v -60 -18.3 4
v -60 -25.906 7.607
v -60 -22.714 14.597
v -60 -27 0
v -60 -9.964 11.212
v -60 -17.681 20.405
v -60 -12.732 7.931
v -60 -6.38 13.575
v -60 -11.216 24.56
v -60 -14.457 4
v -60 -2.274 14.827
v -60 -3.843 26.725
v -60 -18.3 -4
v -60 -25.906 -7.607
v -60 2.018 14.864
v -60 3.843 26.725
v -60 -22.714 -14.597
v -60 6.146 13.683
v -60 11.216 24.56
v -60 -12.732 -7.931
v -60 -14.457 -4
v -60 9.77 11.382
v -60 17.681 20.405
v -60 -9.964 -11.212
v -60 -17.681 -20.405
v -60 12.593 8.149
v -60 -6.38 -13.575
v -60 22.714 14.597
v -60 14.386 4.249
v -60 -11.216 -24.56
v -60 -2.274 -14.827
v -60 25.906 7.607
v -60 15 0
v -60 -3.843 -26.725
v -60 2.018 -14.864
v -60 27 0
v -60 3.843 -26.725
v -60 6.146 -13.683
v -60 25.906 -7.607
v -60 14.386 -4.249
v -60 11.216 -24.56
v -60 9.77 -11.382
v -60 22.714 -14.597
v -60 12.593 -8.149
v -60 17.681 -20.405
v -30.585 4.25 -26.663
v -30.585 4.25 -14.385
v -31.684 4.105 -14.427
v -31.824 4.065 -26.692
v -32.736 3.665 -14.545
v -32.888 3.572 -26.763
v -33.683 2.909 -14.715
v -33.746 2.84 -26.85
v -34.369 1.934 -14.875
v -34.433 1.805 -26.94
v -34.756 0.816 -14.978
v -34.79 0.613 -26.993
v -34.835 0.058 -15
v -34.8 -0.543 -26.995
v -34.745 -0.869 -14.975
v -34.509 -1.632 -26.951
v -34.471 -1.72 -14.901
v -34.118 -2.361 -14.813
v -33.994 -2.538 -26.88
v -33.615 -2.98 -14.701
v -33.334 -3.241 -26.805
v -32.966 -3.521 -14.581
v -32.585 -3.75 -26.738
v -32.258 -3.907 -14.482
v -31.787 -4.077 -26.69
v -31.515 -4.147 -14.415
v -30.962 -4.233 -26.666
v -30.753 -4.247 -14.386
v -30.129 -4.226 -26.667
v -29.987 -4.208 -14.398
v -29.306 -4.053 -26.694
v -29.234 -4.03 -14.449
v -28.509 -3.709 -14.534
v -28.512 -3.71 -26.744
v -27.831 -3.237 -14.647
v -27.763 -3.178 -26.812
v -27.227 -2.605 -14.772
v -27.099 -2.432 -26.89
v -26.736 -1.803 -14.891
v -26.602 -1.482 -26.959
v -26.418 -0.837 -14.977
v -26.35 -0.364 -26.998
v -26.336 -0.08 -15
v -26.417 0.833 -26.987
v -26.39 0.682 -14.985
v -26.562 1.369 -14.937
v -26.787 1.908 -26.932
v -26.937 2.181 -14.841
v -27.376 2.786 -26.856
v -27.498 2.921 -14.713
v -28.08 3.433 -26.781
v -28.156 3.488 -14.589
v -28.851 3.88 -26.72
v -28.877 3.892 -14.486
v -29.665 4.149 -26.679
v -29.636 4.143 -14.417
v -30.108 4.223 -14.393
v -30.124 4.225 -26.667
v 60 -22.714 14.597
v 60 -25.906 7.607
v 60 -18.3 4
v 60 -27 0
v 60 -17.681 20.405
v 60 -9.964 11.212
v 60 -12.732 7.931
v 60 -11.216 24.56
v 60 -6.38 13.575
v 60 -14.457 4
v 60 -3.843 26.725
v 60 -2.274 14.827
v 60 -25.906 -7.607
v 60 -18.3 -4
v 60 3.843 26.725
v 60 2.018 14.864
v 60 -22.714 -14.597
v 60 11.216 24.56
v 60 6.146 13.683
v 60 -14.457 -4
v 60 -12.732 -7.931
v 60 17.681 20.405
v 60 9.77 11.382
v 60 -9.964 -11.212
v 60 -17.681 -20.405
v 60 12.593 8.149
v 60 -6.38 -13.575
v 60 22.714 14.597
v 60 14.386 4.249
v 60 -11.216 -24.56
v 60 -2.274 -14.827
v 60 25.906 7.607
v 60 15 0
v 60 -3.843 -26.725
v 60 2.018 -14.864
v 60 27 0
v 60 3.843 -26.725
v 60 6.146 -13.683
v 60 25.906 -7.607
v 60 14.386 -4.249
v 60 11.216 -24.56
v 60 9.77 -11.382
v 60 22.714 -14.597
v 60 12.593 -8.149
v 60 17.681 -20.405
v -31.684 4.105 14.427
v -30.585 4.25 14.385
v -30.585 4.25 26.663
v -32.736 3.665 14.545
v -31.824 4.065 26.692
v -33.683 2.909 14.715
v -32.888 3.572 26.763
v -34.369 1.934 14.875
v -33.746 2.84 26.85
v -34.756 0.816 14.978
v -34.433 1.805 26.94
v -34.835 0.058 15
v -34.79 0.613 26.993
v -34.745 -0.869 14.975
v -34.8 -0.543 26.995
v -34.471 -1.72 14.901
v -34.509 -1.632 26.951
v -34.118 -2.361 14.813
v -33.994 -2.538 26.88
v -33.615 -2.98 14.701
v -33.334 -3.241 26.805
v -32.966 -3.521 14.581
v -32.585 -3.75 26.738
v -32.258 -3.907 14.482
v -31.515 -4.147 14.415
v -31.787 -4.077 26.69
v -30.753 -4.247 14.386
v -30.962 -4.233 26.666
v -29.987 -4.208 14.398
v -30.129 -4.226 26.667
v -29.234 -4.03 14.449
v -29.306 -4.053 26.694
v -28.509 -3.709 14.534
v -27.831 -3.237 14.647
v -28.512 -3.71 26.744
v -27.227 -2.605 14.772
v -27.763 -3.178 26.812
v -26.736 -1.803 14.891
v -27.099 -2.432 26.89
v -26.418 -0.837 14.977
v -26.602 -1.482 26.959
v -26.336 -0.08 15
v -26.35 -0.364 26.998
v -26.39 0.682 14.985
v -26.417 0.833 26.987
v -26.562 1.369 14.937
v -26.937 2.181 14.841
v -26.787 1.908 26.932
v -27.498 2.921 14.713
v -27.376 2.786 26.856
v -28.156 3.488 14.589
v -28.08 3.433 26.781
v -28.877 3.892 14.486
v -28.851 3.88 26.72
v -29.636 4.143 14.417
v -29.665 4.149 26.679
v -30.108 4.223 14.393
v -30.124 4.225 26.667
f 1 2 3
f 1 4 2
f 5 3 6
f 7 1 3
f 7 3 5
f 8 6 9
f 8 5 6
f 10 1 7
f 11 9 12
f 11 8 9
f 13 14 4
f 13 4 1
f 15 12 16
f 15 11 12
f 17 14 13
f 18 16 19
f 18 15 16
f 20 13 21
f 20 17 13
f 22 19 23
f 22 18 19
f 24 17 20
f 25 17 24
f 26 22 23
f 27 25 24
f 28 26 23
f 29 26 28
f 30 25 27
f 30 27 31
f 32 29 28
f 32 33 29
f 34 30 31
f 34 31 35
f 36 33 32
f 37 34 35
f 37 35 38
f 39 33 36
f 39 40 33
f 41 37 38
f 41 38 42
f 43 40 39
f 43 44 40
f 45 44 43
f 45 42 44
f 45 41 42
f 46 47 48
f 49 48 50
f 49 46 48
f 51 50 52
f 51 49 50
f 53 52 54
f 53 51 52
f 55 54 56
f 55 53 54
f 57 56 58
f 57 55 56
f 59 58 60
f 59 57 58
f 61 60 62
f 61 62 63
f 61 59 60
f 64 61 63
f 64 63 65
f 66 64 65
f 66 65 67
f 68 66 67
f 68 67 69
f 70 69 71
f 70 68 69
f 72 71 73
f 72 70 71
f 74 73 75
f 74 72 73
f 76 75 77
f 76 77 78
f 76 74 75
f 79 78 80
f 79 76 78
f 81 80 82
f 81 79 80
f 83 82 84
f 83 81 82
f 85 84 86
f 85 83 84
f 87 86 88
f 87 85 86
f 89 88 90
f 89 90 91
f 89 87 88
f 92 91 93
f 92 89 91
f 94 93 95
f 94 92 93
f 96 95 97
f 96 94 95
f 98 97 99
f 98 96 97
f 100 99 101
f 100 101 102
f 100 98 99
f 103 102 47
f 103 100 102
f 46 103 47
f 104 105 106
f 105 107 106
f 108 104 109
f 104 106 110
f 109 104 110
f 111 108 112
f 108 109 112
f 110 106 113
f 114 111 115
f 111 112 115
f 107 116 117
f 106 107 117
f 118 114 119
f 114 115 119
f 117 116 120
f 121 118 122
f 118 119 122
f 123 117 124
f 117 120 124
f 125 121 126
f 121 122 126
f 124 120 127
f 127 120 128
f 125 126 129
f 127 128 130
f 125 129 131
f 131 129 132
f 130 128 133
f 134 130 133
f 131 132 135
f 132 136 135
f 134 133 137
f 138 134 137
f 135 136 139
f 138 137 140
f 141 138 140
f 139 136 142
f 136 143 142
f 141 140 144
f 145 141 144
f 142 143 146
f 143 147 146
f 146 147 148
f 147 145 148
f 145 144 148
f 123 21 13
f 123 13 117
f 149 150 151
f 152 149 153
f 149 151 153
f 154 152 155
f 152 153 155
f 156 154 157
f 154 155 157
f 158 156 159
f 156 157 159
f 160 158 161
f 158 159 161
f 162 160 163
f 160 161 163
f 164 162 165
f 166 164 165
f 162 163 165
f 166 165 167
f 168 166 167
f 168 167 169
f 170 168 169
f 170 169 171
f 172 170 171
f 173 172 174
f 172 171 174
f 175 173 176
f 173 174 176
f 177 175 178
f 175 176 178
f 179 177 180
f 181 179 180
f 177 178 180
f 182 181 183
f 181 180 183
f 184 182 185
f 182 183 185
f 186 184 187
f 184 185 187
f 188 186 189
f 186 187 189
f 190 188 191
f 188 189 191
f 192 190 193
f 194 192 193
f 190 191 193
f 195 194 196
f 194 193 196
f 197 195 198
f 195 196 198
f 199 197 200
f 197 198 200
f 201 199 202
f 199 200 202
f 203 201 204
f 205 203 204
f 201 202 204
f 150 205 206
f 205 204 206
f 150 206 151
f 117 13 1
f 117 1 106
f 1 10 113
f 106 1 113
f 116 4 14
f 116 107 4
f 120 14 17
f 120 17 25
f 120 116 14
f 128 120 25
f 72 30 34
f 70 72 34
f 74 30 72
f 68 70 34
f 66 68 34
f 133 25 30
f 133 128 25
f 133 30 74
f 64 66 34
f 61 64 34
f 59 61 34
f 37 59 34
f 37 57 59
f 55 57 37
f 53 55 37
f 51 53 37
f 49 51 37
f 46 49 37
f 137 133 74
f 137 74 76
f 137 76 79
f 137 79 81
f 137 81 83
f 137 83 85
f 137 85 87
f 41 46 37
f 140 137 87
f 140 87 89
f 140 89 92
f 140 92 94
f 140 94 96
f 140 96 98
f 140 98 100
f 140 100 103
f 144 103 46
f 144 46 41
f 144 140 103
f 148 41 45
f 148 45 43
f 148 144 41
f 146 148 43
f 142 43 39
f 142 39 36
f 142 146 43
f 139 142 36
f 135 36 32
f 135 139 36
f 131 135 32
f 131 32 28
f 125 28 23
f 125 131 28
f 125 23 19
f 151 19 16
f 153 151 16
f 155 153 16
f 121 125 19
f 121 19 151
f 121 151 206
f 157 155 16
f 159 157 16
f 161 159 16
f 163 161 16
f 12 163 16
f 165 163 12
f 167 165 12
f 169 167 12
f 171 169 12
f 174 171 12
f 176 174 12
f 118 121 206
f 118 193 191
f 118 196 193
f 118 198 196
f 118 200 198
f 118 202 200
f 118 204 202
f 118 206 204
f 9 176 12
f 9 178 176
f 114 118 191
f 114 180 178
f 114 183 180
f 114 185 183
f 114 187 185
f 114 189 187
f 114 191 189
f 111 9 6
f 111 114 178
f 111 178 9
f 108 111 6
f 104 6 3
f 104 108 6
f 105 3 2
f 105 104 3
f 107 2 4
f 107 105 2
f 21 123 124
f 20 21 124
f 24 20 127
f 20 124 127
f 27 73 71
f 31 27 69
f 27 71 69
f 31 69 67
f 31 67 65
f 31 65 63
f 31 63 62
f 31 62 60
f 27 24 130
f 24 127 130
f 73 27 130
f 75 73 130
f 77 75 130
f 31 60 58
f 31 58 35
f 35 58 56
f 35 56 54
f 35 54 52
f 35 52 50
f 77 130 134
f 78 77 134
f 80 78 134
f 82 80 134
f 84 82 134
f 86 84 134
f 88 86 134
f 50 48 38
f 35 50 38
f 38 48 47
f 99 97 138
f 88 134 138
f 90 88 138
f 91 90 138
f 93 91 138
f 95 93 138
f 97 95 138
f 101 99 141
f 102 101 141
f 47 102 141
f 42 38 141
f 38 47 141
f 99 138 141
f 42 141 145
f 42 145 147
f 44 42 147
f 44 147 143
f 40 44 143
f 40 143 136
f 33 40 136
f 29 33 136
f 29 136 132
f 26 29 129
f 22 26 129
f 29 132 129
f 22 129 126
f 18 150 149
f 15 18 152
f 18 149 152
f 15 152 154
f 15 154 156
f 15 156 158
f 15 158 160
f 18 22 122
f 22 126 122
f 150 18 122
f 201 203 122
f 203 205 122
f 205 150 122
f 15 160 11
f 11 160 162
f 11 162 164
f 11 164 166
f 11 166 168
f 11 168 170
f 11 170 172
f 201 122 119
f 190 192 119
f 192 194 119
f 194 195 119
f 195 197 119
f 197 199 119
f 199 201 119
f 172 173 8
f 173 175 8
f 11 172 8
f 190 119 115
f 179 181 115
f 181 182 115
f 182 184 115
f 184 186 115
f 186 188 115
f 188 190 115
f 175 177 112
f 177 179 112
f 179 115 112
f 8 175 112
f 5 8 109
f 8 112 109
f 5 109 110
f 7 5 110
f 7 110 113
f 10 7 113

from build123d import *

# Parameters (mm, degrees)
IZIM1_W               = 120
IZIM1_H               = 12
IZIM2_W               = 120
IZIM2_H               = 8
KES_EKSTR_ZYON1_DEPTH = 18.3


with BuildPart() as part:
    # Çizim1 → Döndür1 (revolve)
    with BuildSketch(Plane.XY, mode=Mode.PRIVATE) as d_nd_r1_sk:
        with Locations((0, 21)):
            Rectangle(IZIM1_W, IZIM1_H)
    revolve(d_nd_r1_sk.sketch.rotate(Axis((-60, 0, 0), (1, 0, 0)), 180), axis=Axis((-60, 0, 0), (1, 0, 0)))

    # Çizim2 → Kes-Ekstrüzyon1 (cut)
    with BuildSketch(Plane(origin=(0, 0, 0), x_dir=(1, 0, 0), z_dir=(0, 1, 0))):
        Rectangle(IZIM2_W, IZIM2_H)
    extrude(amount=-KES_EKSTR_ZYON1_DEPTH, mode=Mode.SUBTRACT)

    # Çizim7 → M10 Dişli Delik4 (revolve, cut)
    with BuildSketch(Plane(origin=(-30.584904592, 0, -30), x_dir=(0, 1, 0), z_dir=(1, 0, 0))):
        Polygon((0, 0), (0, 37.113657631), (4.25, 34.56), (4.25, 0.775), (5.025, 0), align=None)
    m10_di_li_delik4 = revolve(axis=Axis((-30.584904592, 0, -36.35), (0, 0, 1)), mode=Mode.SUBTRACT)

    # Aynalama1: M10 Dişli Delik4 across plane
    add(m10_di_li_delik4.mirror(Plane.XY), mode=Mode.SUBTRACT)


solid = part.part
